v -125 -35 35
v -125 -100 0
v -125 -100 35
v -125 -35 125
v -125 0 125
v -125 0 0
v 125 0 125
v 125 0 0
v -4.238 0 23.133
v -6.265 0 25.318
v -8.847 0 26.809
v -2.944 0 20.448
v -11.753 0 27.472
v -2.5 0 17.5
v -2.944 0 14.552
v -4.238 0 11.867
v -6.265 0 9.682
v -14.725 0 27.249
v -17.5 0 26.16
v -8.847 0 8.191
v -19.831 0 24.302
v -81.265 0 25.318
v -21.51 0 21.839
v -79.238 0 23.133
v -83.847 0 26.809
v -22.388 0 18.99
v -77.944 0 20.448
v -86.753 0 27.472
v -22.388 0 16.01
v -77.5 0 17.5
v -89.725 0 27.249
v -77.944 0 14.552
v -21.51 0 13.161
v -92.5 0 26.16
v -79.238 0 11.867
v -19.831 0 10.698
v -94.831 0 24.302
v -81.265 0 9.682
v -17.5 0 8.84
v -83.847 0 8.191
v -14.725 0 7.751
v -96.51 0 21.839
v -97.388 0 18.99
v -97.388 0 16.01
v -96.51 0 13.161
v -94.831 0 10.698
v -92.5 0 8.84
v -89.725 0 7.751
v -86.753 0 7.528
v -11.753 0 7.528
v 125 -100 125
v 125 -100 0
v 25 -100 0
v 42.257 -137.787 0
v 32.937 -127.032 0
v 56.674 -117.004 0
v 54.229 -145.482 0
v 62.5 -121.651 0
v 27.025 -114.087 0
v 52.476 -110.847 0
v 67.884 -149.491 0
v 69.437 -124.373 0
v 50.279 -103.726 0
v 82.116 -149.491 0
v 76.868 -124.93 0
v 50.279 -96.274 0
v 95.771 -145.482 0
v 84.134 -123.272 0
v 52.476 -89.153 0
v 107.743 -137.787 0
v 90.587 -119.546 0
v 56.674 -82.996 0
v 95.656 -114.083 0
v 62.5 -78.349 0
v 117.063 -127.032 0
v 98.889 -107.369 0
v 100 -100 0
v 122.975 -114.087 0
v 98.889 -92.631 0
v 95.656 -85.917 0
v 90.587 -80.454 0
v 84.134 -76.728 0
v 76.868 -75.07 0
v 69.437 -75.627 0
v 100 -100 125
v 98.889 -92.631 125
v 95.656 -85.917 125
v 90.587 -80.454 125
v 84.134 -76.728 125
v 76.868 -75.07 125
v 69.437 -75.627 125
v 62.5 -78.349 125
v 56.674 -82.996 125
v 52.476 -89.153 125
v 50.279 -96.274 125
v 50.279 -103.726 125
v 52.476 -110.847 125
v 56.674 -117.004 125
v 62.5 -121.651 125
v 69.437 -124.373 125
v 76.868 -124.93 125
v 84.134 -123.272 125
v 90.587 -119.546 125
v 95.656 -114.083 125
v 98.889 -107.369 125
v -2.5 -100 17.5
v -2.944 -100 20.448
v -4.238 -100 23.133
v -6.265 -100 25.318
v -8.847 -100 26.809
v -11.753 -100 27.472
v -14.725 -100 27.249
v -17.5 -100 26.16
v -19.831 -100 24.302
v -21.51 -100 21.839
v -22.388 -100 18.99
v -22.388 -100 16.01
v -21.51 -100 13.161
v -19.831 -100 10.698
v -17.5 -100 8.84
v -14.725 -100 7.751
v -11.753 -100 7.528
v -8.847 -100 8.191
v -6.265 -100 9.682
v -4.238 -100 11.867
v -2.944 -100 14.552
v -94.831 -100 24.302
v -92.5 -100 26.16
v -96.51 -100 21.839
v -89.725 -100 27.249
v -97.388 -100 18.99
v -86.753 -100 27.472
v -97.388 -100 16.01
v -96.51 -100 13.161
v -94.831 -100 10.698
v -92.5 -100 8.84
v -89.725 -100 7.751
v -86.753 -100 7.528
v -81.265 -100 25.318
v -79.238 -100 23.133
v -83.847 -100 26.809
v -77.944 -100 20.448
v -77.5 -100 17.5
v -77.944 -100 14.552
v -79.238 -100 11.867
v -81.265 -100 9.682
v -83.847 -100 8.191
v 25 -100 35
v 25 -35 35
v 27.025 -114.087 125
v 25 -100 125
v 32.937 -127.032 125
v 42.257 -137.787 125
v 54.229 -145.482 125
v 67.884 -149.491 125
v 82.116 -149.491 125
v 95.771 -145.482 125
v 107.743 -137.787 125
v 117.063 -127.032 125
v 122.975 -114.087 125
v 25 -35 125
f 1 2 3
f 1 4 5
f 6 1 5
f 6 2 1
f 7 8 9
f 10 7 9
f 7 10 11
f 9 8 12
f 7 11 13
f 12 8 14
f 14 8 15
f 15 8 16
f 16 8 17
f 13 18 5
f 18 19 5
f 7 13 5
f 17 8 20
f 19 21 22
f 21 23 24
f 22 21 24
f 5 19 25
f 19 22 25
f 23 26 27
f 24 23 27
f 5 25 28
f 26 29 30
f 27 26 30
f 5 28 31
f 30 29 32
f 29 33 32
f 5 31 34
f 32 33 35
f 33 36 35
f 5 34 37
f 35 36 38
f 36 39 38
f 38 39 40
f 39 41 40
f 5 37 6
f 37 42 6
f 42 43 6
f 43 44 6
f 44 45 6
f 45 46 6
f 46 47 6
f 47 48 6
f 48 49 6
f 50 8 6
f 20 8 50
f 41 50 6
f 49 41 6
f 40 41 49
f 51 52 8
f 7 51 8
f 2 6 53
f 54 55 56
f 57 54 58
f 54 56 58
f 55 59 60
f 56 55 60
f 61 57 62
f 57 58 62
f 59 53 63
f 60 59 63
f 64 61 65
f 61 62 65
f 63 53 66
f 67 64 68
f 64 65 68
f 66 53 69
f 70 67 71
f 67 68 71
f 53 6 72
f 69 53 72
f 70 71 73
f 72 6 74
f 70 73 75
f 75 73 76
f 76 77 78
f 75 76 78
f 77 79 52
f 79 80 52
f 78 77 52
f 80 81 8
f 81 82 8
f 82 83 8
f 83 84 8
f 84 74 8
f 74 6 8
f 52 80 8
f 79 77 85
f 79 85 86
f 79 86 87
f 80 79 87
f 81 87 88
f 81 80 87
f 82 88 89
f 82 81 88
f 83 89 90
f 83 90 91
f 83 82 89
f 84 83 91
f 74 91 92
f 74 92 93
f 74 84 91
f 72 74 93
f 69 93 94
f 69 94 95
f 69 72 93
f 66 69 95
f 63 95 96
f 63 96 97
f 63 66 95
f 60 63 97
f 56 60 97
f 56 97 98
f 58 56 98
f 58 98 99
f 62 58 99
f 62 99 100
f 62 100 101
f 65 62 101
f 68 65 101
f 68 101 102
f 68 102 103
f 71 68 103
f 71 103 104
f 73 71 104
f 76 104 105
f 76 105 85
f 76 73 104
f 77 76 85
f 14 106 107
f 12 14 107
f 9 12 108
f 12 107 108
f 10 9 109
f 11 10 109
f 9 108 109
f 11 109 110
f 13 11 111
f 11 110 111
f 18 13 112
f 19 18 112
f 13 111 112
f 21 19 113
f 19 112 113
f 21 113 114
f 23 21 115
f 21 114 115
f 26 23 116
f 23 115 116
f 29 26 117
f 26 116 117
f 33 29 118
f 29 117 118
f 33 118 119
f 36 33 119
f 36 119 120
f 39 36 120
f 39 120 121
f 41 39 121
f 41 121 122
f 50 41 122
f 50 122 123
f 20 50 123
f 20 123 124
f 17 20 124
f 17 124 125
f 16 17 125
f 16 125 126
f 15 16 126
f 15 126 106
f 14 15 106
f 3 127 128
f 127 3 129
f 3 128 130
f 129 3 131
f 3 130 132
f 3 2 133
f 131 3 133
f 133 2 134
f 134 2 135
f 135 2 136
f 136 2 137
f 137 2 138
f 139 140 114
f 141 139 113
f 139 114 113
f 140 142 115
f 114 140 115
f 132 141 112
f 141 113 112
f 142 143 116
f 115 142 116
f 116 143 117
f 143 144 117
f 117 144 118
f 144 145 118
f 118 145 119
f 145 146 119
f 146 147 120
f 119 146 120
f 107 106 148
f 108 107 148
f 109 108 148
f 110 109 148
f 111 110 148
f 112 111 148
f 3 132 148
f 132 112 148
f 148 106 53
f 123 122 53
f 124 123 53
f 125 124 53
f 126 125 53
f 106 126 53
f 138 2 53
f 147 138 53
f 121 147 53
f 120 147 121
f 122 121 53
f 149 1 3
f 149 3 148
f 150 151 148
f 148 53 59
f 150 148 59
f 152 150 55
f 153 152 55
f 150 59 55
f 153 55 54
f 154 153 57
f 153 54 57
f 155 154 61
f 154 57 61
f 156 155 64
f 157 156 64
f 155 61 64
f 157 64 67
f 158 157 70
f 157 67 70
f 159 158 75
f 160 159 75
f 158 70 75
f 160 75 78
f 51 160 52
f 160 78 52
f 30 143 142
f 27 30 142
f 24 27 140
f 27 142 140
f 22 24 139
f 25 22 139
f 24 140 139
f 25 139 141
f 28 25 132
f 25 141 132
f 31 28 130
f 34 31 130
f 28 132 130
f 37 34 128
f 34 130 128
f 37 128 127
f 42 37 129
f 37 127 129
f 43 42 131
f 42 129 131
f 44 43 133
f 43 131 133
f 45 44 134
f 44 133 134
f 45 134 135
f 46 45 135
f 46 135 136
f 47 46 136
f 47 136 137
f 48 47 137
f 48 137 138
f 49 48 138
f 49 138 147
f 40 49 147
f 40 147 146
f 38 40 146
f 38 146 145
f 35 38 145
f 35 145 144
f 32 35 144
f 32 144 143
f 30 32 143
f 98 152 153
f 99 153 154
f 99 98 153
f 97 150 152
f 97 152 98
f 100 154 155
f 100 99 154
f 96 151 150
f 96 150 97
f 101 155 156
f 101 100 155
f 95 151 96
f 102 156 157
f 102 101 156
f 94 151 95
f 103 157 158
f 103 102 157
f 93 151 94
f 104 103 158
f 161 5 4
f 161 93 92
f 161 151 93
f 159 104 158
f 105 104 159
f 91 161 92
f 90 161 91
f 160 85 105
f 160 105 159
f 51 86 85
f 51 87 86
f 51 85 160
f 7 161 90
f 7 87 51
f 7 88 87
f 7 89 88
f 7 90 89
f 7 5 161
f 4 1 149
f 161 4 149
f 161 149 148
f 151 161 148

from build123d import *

# Parameters (mm, degrees)
F0_R     = 25
F1_DEPTH = 125
F0_W     = 150
F0_H     = 65
F2_DEPTH = 35
F3_R     = 10
F4_DEPTH = 100.001


with BuildPart() as f1:
    # F0 (on Top) → F1 (new body)
    with BuildSketch(Plane.XY):
        with BuildLine():
            Line((125, 0), (-125, 0))
            Line((-125, 0), (-125, -35))
            Line((-125, -35), (25, -35))
            Line((25, -35), (25, -100))
            ThreePointArc((25, -100), (75, -150), (125, -100))
            Line((125, -100), (125, 0))
        make_face()
        with Locations((75, -100)):
            Circle(F0_R, mode=Mode.SUBTRACT)
    extrude(amount=F1_DEPTH)

    # F0 (on Top) → F2 (join)
    with BuildSketch(Plane.XY):
        with Locations((-50, -67.5)):
            Rectangle(F0_W, F0_H)
    extrude(amount=F2_DEPTH)

    # F3 (on face) → F4 (cut, through all)
    with BuildSketch(Plane.XZ.offset(100)):
        with Locations((-87.5, 17.5)):
            Circle(F3_R)
        with Locations((-12.5, 17.5)):
            Circle(F3_R)
    extrude(amount=-F4_DEPTH, mode=Mode.SUBTRACT)


solid = f1.part
